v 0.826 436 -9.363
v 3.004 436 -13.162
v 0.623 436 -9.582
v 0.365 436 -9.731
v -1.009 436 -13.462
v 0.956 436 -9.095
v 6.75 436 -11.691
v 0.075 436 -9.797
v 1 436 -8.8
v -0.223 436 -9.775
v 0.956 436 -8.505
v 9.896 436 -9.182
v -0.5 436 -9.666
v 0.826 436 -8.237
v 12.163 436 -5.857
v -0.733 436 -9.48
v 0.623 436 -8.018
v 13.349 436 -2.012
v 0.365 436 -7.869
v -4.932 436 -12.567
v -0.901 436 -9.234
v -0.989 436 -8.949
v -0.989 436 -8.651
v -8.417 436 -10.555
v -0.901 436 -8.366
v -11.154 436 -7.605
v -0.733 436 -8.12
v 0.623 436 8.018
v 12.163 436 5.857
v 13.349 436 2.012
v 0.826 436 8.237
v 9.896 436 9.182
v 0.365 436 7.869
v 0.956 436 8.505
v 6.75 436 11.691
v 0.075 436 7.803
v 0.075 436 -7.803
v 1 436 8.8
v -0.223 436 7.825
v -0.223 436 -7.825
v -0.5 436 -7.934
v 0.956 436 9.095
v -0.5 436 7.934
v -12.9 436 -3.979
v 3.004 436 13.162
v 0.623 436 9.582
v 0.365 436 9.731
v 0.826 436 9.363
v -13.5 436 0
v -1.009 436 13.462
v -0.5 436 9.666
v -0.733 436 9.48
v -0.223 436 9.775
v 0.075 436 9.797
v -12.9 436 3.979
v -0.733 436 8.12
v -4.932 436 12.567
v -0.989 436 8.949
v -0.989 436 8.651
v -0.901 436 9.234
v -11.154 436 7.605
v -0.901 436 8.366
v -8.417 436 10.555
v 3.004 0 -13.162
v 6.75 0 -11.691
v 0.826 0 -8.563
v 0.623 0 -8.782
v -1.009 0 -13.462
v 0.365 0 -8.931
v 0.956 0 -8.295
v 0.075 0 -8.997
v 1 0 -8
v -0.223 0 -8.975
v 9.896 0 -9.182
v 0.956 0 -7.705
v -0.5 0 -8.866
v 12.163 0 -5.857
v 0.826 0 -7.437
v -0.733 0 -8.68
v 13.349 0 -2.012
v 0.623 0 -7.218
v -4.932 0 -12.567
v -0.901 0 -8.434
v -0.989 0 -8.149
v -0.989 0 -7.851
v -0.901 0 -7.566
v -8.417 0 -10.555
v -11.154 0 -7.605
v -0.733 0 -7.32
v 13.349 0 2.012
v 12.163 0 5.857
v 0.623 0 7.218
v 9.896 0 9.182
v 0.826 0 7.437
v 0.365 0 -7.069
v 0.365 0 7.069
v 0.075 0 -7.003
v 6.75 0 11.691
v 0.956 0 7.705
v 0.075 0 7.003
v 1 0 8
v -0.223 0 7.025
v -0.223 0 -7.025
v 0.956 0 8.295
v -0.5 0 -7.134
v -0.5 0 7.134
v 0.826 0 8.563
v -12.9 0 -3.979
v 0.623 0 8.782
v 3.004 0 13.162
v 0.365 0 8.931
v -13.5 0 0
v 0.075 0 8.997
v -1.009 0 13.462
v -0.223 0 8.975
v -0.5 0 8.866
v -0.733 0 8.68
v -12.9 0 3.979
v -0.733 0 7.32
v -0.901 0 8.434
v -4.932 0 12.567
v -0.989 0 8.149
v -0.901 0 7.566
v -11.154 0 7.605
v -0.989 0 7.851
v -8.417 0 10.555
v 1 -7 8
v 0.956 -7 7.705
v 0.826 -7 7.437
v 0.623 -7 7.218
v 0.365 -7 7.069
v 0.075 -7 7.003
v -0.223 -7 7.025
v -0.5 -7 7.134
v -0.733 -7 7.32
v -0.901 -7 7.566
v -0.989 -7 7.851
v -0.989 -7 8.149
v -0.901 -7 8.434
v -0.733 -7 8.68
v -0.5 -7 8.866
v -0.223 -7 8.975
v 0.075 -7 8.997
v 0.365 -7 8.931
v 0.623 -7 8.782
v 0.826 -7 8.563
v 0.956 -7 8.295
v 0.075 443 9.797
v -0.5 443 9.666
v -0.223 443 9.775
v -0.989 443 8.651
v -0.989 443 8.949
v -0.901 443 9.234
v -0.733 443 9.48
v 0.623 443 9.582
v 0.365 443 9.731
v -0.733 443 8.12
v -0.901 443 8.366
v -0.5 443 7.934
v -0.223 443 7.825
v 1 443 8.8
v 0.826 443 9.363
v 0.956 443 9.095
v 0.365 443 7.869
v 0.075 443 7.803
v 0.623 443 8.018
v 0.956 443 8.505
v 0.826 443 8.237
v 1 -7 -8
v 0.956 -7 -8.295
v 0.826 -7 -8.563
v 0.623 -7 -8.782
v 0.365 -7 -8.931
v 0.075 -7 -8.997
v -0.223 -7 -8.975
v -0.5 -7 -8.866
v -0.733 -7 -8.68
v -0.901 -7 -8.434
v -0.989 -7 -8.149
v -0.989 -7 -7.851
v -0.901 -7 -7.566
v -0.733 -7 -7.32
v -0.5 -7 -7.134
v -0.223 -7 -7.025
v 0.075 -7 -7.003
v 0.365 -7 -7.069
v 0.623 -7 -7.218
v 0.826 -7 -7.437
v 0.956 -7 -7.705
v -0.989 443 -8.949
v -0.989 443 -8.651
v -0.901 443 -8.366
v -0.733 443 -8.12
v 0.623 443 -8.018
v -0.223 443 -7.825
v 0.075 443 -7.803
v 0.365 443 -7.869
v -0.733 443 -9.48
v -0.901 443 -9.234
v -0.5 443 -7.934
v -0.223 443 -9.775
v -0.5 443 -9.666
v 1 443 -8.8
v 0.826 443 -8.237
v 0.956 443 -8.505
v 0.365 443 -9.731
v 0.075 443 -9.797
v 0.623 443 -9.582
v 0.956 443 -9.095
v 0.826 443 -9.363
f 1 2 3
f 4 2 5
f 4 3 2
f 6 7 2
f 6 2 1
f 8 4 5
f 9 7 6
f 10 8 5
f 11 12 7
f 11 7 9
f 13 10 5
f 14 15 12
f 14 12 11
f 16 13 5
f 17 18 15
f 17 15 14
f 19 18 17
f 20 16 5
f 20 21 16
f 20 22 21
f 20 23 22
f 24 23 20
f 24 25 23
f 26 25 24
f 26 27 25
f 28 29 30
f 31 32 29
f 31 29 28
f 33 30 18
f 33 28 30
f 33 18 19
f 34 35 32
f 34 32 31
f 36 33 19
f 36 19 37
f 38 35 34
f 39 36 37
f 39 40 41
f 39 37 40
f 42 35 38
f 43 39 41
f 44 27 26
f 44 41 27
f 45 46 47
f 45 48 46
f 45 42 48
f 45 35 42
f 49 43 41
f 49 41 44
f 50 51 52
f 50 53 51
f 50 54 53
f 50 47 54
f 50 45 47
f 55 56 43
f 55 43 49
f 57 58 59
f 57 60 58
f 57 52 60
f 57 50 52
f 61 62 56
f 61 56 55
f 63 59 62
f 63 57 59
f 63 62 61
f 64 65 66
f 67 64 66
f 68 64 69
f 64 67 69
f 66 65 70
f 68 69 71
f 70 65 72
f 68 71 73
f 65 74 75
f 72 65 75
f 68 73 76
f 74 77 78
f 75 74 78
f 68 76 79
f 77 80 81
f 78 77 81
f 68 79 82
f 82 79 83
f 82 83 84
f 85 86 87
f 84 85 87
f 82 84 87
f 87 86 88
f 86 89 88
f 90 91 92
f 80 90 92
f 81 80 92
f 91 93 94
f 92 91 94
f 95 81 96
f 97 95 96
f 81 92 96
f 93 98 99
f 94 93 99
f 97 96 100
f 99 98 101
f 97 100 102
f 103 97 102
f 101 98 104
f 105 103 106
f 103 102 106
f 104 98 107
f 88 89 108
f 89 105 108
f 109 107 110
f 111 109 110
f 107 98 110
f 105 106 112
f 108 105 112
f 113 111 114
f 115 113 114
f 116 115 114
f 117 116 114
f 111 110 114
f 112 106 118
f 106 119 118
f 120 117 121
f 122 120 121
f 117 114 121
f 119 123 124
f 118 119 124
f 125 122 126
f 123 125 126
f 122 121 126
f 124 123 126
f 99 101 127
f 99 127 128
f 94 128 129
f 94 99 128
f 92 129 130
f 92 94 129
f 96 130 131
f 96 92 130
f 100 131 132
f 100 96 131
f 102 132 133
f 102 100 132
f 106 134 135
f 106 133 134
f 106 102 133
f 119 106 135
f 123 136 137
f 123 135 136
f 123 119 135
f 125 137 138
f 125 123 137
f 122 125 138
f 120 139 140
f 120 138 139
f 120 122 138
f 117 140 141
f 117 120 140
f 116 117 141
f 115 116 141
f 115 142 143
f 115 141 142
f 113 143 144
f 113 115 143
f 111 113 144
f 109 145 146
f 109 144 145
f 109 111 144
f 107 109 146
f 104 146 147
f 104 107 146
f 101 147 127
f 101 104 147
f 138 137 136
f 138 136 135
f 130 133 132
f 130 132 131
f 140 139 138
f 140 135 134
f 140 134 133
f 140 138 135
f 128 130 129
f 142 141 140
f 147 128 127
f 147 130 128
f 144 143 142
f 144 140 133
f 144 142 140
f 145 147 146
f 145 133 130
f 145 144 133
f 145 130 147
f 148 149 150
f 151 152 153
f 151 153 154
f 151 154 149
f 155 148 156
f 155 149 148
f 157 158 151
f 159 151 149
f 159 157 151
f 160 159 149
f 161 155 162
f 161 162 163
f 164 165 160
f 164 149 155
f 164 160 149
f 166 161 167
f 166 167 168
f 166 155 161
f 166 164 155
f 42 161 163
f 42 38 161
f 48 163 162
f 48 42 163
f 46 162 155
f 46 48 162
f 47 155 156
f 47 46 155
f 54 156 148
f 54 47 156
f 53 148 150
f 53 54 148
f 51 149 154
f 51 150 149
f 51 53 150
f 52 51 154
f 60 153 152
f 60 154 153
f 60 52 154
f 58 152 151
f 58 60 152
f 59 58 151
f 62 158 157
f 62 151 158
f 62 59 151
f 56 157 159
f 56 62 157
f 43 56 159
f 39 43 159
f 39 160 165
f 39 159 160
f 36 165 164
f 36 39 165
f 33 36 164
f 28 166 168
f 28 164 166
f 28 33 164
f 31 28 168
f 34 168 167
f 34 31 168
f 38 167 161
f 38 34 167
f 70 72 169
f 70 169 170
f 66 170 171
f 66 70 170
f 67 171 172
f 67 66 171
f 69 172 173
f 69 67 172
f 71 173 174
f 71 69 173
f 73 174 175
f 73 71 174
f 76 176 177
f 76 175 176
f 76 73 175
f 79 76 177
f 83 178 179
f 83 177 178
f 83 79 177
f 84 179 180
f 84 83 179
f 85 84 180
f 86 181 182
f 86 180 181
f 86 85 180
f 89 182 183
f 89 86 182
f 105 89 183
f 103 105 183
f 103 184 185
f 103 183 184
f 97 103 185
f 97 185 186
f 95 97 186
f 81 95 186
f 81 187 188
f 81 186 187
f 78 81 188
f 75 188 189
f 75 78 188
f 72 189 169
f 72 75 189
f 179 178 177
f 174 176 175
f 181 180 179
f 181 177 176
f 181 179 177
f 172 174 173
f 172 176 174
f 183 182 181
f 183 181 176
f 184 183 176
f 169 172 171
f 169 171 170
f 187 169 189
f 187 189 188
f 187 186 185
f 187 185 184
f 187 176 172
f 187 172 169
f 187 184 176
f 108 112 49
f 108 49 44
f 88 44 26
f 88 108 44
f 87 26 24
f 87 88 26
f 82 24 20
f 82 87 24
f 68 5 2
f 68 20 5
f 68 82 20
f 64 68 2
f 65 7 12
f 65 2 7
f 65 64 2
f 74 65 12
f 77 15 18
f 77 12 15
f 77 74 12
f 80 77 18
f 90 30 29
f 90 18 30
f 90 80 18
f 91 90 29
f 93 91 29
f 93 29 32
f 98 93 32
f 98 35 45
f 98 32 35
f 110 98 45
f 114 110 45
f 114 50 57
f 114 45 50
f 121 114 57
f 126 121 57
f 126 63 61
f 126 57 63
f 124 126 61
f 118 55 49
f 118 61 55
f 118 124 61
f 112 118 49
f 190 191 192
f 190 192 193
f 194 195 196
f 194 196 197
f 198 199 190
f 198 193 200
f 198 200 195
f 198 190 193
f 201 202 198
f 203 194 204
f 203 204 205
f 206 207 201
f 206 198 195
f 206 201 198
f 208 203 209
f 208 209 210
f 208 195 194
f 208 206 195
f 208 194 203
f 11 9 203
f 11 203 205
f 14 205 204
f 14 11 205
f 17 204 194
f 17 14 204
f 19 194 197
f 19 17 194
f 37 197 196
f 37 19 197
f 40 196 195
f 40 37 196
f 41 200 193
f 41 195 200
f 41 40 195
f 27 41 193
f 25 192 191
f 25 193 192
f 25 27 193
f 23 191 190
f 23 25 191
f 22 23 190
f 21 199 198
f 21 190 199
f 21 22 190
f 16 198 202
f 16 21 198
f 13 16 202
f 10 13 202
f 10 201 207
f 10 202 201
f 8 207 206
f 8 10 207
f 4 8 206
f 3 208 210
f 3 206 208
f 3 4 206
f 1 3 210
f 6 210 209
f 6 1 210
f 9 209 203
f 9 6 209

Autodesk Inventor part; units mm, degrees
ref_plane "YZ Plane" through (0, 0, 0) normal (1, 0, 0) x (0, 1, 0)
ref_plane "XZ Plane" through (0, 0, 0) normal (0, 1, 0) x (-1, 0, 0)
ref_plane "XY Plane" through (0, 0, 0) normal (0, 0, 1) x (1, 0, 0)
sketch "Sketch1" plane through (0, 0, 0) normal (0, 1, 0) x (-1, 0, 0)
  circle A0 centre (0, 0) radius 13.5
  dimension "d0" = 27
extrude "Extrusion1" add sketch "Sketch1" along normal blind 436
sketch "Sketch2" plane through (0, 436, 0) normal (0, 1, 0) x (1, 0, 0)
  circle A0 centre (0, -8.8) radius 1
  circle A1 centre (0, 8.8) radius 1
  circle A2 centre (0, 0) radius 13.5 projected
  dimension "d3" = 2
  dimension "d4" = 2
  dimension "d5" = 8.8
  dimension "d6" = 8.8
extrude "Extrusion2" add sketch "Sketch2" along normal blind 7 contours A0 | A1
sketch "Sketch3" plane through (0, 0, 0) normal (0, -1, 0) x (1, 0, 0)
  circle A0 centre (0, 8) radius 1
  circle A1 centre (0, -8) radius 1
  point P0 (0, 0)
  dimension "d9" = 2
  dimension "d10" = 2
  dimension "d15" = 8
  dimension "d16" = 8
extrude "Extrusion3" add sketch "Sketch3" along normal blind 7
sketch "Sketch4" plane through (0, 0, 0) normal (0, -1, 0) x (1, 0, 0)
  point P0 (0, 0)
properties part number "UV-15W"
